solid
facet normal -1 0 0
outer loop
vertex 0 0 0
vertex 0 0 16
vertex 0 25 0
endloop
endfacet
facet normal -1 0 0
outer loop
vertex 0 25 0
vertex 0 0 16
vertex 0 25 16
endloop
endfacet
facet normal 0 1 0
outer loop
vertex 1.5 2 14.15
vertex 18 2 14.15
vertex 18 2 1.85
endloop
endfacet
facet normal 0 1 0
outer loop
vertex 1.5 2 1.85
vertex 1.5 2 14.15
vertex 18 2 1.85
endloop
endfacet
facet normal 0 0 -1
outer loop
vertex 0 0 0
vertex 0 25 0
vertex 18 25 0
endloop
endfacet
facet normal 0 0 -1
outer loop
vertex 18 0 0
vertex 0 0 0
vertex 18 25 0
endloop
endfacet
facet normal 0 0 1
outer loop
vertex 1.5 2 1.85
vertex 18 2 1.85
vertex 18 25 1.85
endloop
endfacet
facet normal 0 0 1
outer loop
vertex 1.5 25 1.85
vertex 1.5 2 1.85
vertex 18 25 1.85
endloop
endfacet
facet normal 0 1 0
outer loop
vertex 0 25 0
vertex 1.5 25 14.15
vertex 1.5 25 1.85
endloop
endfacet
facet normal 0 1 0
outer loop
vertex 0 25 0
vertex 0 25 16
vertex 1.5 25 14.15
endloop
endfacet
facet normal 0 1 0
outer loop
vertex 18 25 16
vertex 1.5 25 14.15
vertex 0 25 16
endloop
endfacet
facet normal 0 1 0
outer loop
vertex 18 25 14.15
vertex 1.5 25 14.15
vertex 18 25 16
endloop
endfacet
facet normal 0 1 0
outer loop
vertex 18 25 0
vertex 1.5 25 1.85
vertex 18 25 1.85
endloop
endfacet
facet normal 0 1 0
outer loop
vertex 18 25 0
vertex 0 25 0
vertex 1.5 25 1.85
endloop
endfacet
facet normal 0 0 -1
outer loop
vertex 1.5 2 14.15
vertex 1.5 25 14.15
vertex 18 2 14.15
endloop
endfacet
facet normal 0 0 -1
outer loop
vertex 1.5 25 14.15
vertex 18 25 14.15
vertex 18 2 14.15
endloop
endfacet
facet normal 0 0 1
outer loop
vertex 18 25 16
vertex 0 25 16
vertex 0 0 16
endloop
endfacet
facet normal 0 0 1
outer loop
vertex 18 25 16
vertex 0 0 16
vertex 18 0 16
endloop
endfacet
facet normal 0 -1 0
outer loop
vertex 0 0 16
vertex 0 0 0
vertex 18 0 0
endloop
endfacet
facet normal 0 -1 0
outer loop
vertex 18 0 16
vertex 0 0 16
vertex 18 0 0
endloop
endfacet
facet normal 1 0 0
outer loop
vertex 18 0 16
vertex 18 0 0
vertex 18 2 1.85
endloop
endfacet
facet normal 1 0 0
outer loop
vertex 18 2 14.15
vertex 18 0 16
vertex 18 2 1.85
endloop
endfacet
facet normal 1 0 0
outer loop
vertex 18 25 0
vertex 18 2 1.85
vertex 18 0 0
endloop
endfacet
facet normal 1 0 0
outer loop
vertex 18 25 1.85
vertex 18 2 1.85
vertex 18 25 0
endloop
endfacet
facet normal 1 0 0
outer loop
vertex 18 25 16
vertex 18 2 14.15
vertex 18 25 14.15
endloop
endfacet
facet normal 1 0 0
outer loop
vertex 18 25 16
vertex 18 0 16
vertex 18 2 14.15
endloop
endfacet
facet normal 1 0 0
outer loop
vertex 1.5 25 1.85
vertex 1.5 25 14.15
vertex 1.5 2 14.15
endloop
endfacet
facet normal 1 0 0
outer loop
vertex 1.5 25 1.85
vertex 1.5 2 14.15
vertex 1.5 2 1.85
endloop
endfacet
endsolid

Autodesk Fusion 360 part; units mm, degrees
box "BoxPrimitive1" add length 25 width 16 height 18 placed x (0, 1, 0) y (0, 0, 1) z (1, 0, 0) at (0, 0, 0)
sketch "Sketch2" plane through (18, 0, 0) normal (1, 0, 0) x (0, 0, -1)
  line L0 (0, 25) -> (-16, 25)
  line L1 (-16, 25) -> (-16, 0)
  line L2 (-16, 0) -> (0, 0)
  line L3 (0, 0) -> (0, 25)
  line L4 (-8, 25) -> (-8, 13.5) construction
  line L5 (-1.85, 25) -> (-14.15, 25)
  line L6 (-14.15, 25) -> (-14.15, 2)
  line L7 (-14.15, 2) -> (-1.85, 2)
  line L8 (-1.85, 2) -> (-1.85, 25)
  line L9 (-1.85, 25) -> (-14.15, 2) construction
  line L10 (-14.15, 25) -> (-1.85, 2) construction
  point P0 (-8, 13.5)
  dimension "d12" = 11.5
  dimension "d13" = 12.3
  dimension "d14" = 23
extrude "Extrude1" cut sketch "Sketch2" against normal blind 16.5 contours L0 L5 L6 L7 L8
equation "Height = 25 mm"
equation "Width = 16 mm"
equation "LengthHole = 16.5 mm"
equation "Length = 18 mm"
equation "d5 = Height"
equation "d6 = Width"
equation "d7 = Length"
equation "WidthHole = 12.3 mm"
equation "Heighthole = 23 mm"
equation "d12 = Heighthole / 2"
equation "d13 = WidthHole"
equation "d14 = Heighthole"
equation "d15 = -LengthHole"
